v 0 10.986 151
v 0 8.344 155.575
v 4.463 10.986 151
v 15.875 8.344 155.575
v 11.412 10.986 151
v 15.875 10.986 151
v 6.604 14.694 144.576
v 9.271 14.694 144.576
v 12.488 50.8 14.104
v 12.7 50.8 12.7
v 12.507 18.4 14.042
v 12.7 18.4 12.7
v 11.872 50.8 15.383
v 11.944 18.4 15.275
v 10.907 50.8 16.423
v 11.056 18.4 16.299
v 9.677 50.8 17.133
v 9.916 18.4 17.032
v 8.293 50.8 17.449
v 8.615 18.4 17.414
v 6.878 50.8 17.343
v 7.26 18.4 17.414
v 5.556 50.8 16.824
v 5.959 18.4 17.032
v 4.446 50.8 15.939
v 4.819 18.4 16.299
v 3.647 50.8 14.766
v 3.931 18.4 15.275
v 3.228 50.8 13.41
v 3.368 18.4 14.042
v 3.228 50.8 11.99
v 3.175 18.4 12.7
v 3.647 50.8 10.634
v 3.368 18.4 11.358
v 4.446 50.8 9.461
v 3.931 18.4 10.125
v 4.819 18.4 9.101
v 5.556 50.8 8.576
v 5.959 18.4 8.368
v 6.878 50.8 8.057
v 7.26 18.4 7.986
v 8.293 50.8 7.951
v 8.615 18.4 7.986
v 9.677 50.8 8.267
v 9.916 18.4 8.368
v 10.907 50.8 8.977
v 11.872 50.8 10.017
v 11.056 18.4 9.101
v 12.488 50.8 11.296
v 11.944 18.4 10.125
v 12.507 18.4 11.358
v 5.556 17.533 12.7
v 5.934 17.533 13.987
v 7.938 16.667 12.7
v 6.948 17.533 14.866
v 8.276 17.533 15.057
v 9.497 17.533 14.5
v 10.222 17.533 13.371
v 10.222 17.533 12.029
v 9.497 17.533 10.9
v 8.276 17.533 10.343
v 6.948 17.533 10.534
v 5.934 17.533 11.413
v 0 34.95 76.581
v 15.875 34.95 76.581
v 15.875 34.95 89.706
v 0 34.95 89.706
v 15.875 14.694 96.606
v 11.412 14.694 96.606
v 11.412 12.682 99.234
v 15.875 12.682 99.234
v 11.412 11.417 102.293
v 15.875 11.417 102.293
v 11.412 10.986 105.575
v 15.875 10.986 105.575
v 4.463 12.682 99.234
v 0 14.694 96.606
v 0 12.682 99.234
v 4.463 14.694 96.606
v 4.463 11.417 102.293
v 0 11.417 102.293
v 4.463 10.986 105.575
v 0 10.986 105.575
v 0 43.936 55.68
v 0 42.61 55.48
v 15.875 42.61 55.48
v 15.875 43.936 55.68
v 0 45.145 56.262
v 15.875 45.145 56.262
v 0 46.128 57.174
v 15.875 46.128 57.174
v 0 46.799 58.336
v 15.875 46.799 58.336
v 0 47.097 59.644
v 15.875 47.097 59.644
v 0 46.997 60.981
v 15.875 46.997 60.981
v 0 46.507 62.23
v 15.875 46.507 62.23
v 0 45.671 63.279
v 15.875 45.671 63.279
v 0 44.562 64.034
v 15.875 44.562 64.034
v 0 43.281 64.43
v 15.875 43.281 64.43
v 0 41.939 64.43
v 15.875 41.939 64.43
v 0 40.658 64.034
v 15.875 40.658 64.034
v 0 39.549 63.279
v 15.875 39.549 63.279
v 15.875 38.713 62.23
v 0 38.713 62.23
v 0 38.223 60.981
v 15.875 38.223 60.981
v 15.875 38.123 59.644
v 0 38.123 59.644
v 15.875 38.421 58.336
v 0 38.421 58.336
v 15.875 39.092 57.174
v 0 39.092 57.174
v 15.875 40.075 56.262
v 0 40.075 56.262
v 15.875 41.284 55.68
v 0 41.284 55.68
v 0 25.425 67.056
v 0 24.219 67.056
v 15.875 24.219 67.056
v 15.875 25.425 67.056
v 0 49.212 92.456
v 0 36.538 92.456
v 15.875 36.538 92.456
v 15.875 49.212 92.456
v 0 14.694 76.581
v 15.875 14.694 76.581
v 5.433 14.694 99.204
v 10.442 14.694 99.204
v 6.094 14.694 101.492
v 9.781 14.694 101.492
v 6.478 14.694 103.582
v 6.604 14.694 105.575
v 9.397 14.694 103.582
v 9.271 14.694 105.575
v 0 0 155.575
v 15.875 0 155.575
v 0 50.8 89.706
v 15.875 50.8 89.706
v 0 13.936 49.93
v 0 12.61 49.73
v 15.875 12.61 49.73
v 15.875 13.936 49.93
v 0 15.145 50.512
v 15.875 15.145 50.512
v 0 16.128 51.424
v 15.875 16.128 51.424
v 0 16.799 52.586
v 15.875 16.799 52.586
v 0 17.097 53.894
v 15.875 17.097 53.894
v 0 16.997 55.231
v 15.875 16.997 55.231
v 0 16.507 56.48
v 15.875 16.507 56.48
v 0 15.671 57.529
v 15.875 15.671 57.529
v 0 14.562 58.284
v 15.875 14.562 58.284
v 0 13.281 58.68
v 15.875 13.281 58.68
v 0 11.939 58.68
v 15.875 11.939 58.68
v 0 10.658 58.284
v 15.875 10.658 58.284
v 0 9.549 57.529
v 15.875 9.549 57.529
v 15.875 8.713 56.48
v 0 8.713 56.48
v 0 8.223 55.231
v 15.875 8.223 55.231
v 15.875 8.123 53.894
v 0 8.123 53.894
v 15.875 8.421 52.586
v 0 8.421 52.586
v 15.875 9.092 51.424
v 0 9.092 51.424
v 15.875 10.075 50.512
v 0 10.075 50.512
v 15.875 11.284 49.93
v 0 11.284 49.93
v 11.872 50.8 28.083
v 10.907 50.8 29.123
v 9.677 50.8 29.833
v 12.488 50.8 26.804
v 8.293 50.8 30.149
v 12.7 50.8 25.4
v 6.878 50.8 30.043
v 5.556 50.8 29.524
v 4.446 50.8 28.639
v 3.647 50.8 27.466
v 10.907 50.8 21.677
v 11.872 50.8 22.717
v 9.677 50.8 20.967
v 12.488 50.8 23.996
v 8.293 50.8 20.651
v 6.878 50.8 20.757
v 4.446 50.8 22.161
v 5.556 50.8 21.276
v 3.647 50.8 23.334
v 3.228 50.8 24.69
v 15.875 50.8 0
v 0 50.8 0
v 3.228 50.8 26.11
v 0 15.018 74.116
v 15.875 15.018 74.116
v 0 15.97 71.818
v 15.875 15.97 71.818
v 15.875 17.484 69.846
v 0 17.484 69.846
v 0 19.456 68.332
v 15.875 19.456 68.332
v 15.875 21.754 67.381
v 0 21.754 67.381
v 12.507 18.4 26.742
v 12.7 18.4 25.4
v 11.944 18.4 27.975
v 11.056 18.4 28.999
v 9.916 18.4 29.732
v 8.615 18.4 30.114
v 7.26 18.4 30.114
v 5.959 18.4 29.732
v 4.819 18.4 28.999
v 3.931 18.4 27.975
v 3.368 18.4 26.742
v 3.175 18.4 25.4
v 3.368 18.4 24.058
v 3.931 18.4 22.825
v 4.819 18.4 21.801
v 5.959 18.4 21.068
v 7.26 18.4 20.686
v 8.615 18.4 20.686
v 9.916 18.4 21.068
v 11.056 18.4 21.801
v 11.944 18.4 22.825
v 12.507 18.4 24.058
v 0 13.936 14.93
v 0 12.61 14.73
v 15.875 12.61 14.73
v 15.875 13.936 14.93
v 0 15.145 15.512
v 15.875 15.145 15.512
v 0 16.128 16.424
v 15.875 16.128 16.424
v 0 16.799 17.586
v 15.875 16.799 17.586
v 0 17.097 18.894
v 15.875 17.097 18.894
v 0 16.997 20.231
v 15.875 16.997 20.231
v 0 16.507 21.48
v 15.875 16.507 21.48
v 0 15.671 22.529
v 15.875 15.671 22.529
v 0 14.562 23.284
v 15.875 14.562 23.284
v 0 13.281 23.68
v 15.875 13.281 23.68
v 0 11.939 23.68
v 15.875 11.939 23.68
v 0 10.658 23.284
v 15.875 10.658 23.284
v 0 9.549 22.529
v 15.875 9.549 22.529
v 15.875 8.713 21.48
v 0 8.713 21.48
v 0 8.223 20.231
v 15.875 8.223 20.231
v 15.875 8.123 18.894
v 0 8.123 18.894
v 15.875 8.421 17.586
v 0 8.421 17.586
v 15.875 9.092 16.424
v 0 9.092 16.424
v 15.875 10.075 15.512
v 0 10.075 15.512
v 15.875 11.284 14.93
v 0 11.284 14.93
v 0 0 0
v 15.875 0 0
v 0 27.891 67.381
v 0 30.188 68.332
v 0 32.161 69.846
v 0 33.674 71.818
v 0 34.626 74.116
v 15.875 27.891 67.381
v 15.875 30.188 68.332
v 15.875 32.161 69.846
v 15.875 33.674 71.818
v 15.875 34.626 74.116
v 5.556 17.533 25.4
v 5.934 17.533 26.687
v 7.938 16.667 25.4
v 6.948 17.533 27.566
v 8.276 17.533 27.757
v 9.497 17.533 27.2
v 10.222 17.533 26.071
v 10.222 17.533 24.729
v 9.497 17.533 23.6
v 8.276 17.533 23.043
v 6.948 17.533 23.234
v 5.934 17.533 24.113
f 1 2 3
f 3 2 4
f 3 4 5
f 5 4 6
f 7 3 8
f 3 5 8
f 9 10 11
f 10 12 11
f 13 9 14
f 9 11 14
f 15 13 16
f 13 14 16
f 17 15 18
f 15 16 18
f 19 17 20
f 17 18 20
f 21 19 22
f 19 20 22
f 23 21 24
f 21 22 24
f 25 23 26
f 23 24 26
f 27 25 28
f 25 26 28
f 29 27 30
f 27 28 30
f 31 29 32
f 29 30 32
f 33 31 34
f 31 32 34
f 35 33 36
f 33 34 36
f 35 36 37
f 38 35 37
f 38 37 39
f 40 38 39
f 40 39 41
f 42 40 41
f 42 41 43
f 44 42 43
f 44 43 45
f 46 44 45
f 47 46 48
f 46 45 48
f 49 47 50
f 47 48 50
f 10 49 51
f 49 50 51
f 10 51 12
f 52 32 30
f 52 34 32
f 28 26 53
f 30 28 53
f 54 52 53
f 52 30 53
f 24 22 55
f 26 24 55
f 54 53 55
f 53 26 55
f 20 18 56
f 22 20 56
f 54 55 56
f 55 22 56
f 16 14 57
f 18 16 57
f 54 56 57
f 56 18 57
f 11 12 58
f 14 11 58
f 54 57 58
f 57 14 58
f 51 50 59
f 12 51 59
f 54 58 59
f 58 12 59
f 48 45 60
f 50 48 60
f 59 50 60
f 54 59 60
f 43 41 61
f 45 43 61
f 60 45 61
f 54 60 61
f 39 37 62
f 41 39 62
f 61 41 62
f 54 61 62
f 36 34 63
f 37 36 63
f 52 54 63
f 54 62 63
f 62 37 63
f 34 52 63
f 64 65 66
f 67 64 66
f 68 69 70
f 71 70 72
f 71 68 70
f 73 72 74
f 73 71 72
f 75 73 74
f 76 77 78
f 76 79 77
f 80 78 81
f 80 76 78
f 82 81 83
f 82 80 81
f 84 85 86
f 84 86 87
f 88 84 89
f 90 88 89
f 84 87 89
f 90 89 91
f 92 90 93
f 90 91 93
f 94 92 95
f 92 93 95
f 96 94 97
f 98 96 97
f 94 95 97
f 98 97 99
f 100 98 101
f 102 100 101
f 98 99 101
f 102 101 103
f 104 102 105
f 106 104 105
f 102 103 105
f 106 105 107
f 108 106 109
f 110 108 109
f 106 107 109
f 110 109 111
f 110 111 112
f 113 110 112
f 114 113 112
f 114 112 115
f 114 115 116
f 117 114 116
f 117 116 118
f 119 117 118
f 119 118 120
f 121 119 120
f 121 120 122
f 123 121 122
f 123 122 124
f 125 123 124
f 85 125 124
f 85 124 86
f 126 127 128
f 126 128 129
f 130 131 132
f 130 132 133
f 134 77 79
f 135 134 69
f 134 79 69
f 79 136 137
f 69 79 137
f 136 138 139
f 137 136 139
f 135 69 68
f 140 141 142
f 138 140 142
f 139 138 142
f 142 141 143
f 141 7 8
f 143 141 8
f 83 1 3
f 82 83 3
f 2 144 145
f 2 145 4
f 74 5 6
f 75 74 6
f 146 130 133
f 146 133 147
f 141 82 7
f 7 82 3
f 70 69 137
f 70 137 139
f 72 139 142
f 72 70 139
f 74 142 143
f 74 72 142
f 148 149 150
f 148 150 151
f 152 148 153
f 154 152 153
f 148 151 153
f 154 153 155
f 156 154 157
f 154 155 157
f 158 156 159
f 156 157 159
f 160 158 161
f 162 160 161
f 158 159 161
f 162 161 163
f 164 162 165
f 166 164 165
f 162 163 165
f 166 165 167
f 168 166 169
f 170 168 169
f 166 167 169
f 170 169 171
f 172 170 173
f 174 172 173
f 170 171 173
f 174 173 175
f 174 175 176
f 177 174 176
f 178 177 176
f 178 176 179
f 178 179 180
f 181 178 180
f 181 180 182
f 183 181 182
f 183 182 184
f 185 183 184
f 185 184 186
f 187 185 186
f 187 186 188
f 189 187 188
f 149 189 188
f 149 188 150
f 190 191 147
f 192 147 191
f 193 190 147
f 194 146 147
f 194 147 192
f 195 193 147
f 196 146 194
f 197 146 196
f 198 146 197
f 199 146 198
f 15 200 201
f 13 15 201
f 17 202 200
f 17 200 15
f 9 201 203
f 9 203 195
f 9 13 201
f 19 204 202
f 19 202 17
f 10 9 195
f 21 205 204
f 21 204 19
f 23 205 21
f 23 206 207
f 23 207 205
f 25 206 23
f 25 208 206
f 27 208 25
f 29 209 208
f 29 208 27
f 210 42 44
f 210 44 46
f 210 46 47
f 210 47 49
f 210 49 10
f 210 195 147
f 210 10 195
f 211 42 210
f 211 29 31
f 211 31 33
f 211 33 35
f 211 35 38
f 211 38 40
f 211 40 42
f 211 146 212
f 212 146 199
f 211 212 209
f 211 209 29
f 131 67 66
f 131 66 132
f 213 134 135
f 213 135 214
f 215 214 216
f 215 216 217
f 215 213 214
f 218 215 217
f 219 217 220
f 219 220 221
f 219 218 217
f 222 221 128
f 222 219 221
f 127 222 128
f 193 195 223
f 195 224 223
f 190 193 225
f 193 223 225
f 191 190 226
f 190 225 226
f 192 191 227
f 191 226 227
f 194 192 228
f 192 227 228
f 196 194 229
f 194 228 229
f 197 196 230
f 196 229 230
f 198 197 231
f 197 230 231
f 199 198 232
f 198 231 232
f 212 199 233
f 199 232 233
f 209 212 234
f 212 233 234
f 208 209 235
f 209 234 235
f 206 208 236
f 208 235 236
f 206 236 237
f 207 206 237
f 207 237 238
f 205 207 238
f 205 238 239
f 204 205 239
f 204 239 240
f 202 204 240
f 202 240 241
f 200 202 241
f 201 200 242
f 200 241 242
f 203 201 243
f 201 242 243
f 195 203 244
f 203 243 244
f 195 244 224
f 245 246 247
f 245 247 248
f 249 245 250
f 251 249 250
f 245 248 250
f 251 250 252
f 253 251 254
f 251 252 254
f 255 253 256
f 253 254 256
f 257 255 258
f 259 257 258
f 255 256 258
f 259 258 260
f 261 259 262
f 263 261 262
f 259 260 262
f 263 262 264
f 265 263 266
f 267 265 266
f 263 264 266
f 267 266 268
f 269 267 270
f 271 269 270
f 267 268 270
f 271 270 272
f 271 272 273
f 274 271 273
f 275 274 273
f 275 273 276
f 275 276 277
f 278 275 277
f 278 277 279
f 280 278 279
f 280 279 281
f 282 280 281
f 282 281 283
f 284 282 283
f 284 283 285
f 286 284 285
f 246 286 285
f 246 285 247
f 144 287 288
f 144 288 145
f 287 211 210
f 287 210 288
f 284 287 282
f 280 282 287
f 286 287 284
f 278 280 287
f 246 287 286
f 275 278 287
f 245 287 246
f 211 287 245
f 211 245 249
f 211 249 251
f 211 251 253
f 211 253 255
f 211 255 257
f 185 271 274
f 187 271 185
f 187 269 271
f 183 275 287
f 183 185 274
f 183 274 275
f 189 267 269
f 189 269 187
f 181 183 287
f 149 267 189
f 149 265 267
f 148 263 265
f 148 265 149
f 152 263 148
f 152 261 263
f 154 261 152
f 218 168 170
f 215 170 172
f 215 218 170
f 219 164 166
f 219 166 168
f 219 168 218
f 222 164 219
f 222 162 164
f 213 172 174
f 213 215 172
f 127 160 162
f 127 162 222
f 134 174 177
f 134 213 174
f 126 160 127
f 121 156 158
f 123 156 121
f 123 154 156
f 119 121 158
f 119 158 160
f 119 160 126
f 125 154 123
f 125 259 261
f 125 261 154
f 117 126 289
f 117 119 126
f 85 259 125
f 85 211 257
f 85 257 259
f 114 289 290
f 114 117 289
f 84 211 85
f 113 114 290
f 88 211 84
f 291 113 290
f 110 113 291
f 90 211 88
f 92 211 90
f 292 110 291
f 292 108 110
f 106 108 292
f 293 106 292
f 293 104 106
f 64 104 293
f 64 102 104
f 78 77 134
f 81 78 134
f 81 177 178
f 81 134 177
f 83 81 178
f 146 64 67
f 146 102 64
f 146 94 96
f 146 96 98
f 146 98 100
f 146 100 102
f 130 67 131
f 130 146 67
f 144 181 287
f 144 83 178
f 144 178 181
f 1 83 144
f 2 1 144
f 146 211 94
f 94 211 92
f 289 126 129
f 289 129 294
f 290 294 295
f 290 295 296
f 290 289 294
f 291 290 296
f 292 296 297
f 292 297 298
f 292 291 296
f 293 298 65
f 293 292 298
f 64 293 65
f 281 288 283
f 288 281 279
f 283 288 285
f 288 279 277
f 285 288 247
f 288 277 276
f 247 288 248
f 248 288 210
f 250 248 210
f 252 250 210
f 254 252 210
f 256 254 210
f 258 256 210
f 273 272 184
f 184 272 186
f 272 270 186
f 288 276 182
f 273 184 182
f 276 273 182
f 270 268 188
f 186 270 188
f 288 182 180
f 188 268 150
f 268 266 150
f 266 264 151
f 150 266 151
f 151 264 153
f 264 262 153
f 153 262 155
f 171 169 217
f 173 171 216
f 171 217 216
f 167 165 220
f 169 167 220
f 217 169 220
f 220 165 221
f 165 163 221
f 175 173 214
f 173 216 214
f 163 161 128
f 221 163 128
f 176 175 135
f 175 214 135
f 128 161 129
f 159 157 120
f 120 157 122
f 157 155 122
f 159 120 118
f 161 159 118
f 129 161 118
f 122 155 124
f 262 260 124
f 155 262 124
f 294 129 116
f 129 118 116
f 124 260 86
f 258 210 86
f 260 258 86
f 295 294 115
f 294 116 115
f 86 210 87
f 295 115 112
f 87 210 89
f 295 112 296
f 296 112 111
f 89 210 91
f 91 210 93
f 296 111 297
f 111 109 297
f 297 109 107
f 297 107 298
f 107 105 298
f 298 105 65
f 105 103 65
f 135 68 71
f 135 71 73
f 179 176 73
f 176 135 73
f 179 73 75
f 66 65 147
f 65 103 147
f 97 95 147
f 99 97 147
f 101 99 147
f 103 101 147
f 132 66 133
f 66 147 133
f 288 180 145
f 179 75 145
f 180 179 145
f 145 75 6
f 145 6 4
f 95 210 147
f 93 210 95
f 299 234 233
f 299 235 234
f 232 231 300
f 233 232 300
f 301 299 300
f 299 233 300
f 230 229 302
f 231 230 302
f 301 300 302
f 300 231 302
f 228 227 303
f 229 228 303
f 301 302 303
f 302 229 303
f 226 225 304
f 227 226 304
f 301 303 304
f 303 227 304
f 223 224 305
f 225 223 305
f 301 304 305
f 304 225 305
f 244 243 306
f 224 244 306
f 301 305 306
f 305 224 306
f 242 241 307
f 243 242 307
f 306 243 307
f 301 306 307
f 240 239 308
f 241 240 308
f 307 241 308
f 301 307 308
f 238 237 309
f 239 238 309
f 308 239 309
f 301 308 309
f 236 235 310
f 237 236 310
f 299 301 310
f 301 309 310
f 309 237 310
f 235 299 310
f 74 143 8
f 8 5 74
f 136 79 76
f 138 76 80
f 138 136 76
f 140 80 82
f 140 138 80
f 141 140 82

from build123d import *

# Parameters (mm, degrees)
EXTRUDE1_DEPTH                   = 15.875
EXTRUDE2_DEPTH                   = 50
F_3_8_0_375_DIAMETER_HOLE1_D     = 9.525
F_3_8_0_375_DIAMETER_HOLE1_DEPTH = 32.4000114
F_3_8_0_375_DIAMETER_HOLE1_TIP   = 1.733408241
SKETCH6_R                        = 4.5
EXTRUDE3_DEPTH                   = 165.426993678


with BuildPart() as part:
    # Sketch1 → Extrude1 (new body)
    with BuildSketch(Plane(origin=(0, 0, 0), x_dir=(0, 0, -1), z_dir=(1, 0, 0))):
        with BuildLine():
            Line((0, 0), (-155.575, 0))
            Line((-155.575, 0), (-155.575, 14.6939))
            Line((-155.575, 14.6939), (-76.581, 14.6939))
            ThreePointArc((-76.581, 14.6939), (-69.845807909, 17.483707909), (-67.056, 24.2189))
            Line((-67.056, 24.2189), (-67.056, 25.4254))
            ThreePointArc((-67.056, 25.4254), (-69.845807909, 32.160592091), (-76.581, 34.9504))
            Line((-76.581, 34.9504), (-89.706369343, 34.9504))
            Line((-89.706369343, 34.9504), (-92.456, 36.5379))
            Line((-92.456, 36.5379), (-92.456, 49.2125))
            Line((-92.456, 49.2125), (-89.706369343, 50.8))
            Line((-89.706369343, 50.8), (0, 50.8))
            Line((0, 50.8), (0, 0))
        make_face()
    extrude(amount=EXTRUDE1_DEPTH)

    # Sketch2 → Extrude2 (cut)
    with BuildSketch(Plane.XY.offset(155.575)):
        Polygon((0, 10.9855), (4.462954262, 10.9855), (6.604, 14.6939), (9.271, 14.6939), (11.412045738, 10.9855), (15.875, 10.9855), (15.875, 23.6855), (0, 23.6855), align=None)
    extrude(amount=-EXTRUDE2_DEPTH, mode=Mode.SUBTRACT)

    # Sketch3 → Cut-Revolve1 (revolve, cut)
    with BuildSketch(Plane.XY.offset(105.575)):
        Polygon((0, 10.9855), (4.462954262, 10.9855), (6.604, 14.6939), (9.271, 14.6939), (11.412045738, 10.9855), (15.875, 10.9855), (15.875, 23.6855), (0, 23.6855), align=None)
    revolve(axis=Axis((15.875, 23.6855, 105.575), (-1, 0, 0)), mode=Mode.SUBTRACT)

    # 3/8 (0.375) Diameter Hole1
    with Locations(Plane(origin=(0, 50.8, 0), x_dir=(-1, 0, 0), z_dir=(0, 1, 0))):
        with Locations((-7.9375, 25.4), (-7.9375, 12.7)):
            Hole(F_3_8_0_375_DIAMETER_HOLE1_D / 2, depth=F_3_8_0_375_DIAMETER_HOLE1_DEPTH)
            with Locations((0, 0, -(F_3_8_0_375_DIAMETER_HOLE1_DEPTH + F_3_8_0_375_DIAMETER_HOLE1_TIP / 2))):  # 140° drill point
                Cone(0, F_3_8_0_375_DIAMETER_HOLE1_D / 2, F_3_8_0_375_DIAMETER_HOLE1_TIP, mode=Mode.SUBTRACT)

    # Sketch6 → Extrude3 (cut, through all)
    with BuildSketch(Plane(origin=(15.875, 0, 0), x_dir=(0, 0, -1), z_dir=(1, 0, 0))):
        with Locations((-54.230000076, 12.609999896)):
            Circle(SKETCH6_R)
        with Locations((-19.230000076, 12.609999896)):
            Circle(SKETCH6_R)
        with Locations((-59.980000078, 42.60999987)):
            Circle(SKETCH6_R)
        Polygon((-155.575, 8.3439), (-144.576477372, 14.6939), (-155.575, 14.6939), align=None)
    extrude(amount=-EXTRUDE3_DEPTH, mode=Mode.SUBTRACT)


solid = part.part
